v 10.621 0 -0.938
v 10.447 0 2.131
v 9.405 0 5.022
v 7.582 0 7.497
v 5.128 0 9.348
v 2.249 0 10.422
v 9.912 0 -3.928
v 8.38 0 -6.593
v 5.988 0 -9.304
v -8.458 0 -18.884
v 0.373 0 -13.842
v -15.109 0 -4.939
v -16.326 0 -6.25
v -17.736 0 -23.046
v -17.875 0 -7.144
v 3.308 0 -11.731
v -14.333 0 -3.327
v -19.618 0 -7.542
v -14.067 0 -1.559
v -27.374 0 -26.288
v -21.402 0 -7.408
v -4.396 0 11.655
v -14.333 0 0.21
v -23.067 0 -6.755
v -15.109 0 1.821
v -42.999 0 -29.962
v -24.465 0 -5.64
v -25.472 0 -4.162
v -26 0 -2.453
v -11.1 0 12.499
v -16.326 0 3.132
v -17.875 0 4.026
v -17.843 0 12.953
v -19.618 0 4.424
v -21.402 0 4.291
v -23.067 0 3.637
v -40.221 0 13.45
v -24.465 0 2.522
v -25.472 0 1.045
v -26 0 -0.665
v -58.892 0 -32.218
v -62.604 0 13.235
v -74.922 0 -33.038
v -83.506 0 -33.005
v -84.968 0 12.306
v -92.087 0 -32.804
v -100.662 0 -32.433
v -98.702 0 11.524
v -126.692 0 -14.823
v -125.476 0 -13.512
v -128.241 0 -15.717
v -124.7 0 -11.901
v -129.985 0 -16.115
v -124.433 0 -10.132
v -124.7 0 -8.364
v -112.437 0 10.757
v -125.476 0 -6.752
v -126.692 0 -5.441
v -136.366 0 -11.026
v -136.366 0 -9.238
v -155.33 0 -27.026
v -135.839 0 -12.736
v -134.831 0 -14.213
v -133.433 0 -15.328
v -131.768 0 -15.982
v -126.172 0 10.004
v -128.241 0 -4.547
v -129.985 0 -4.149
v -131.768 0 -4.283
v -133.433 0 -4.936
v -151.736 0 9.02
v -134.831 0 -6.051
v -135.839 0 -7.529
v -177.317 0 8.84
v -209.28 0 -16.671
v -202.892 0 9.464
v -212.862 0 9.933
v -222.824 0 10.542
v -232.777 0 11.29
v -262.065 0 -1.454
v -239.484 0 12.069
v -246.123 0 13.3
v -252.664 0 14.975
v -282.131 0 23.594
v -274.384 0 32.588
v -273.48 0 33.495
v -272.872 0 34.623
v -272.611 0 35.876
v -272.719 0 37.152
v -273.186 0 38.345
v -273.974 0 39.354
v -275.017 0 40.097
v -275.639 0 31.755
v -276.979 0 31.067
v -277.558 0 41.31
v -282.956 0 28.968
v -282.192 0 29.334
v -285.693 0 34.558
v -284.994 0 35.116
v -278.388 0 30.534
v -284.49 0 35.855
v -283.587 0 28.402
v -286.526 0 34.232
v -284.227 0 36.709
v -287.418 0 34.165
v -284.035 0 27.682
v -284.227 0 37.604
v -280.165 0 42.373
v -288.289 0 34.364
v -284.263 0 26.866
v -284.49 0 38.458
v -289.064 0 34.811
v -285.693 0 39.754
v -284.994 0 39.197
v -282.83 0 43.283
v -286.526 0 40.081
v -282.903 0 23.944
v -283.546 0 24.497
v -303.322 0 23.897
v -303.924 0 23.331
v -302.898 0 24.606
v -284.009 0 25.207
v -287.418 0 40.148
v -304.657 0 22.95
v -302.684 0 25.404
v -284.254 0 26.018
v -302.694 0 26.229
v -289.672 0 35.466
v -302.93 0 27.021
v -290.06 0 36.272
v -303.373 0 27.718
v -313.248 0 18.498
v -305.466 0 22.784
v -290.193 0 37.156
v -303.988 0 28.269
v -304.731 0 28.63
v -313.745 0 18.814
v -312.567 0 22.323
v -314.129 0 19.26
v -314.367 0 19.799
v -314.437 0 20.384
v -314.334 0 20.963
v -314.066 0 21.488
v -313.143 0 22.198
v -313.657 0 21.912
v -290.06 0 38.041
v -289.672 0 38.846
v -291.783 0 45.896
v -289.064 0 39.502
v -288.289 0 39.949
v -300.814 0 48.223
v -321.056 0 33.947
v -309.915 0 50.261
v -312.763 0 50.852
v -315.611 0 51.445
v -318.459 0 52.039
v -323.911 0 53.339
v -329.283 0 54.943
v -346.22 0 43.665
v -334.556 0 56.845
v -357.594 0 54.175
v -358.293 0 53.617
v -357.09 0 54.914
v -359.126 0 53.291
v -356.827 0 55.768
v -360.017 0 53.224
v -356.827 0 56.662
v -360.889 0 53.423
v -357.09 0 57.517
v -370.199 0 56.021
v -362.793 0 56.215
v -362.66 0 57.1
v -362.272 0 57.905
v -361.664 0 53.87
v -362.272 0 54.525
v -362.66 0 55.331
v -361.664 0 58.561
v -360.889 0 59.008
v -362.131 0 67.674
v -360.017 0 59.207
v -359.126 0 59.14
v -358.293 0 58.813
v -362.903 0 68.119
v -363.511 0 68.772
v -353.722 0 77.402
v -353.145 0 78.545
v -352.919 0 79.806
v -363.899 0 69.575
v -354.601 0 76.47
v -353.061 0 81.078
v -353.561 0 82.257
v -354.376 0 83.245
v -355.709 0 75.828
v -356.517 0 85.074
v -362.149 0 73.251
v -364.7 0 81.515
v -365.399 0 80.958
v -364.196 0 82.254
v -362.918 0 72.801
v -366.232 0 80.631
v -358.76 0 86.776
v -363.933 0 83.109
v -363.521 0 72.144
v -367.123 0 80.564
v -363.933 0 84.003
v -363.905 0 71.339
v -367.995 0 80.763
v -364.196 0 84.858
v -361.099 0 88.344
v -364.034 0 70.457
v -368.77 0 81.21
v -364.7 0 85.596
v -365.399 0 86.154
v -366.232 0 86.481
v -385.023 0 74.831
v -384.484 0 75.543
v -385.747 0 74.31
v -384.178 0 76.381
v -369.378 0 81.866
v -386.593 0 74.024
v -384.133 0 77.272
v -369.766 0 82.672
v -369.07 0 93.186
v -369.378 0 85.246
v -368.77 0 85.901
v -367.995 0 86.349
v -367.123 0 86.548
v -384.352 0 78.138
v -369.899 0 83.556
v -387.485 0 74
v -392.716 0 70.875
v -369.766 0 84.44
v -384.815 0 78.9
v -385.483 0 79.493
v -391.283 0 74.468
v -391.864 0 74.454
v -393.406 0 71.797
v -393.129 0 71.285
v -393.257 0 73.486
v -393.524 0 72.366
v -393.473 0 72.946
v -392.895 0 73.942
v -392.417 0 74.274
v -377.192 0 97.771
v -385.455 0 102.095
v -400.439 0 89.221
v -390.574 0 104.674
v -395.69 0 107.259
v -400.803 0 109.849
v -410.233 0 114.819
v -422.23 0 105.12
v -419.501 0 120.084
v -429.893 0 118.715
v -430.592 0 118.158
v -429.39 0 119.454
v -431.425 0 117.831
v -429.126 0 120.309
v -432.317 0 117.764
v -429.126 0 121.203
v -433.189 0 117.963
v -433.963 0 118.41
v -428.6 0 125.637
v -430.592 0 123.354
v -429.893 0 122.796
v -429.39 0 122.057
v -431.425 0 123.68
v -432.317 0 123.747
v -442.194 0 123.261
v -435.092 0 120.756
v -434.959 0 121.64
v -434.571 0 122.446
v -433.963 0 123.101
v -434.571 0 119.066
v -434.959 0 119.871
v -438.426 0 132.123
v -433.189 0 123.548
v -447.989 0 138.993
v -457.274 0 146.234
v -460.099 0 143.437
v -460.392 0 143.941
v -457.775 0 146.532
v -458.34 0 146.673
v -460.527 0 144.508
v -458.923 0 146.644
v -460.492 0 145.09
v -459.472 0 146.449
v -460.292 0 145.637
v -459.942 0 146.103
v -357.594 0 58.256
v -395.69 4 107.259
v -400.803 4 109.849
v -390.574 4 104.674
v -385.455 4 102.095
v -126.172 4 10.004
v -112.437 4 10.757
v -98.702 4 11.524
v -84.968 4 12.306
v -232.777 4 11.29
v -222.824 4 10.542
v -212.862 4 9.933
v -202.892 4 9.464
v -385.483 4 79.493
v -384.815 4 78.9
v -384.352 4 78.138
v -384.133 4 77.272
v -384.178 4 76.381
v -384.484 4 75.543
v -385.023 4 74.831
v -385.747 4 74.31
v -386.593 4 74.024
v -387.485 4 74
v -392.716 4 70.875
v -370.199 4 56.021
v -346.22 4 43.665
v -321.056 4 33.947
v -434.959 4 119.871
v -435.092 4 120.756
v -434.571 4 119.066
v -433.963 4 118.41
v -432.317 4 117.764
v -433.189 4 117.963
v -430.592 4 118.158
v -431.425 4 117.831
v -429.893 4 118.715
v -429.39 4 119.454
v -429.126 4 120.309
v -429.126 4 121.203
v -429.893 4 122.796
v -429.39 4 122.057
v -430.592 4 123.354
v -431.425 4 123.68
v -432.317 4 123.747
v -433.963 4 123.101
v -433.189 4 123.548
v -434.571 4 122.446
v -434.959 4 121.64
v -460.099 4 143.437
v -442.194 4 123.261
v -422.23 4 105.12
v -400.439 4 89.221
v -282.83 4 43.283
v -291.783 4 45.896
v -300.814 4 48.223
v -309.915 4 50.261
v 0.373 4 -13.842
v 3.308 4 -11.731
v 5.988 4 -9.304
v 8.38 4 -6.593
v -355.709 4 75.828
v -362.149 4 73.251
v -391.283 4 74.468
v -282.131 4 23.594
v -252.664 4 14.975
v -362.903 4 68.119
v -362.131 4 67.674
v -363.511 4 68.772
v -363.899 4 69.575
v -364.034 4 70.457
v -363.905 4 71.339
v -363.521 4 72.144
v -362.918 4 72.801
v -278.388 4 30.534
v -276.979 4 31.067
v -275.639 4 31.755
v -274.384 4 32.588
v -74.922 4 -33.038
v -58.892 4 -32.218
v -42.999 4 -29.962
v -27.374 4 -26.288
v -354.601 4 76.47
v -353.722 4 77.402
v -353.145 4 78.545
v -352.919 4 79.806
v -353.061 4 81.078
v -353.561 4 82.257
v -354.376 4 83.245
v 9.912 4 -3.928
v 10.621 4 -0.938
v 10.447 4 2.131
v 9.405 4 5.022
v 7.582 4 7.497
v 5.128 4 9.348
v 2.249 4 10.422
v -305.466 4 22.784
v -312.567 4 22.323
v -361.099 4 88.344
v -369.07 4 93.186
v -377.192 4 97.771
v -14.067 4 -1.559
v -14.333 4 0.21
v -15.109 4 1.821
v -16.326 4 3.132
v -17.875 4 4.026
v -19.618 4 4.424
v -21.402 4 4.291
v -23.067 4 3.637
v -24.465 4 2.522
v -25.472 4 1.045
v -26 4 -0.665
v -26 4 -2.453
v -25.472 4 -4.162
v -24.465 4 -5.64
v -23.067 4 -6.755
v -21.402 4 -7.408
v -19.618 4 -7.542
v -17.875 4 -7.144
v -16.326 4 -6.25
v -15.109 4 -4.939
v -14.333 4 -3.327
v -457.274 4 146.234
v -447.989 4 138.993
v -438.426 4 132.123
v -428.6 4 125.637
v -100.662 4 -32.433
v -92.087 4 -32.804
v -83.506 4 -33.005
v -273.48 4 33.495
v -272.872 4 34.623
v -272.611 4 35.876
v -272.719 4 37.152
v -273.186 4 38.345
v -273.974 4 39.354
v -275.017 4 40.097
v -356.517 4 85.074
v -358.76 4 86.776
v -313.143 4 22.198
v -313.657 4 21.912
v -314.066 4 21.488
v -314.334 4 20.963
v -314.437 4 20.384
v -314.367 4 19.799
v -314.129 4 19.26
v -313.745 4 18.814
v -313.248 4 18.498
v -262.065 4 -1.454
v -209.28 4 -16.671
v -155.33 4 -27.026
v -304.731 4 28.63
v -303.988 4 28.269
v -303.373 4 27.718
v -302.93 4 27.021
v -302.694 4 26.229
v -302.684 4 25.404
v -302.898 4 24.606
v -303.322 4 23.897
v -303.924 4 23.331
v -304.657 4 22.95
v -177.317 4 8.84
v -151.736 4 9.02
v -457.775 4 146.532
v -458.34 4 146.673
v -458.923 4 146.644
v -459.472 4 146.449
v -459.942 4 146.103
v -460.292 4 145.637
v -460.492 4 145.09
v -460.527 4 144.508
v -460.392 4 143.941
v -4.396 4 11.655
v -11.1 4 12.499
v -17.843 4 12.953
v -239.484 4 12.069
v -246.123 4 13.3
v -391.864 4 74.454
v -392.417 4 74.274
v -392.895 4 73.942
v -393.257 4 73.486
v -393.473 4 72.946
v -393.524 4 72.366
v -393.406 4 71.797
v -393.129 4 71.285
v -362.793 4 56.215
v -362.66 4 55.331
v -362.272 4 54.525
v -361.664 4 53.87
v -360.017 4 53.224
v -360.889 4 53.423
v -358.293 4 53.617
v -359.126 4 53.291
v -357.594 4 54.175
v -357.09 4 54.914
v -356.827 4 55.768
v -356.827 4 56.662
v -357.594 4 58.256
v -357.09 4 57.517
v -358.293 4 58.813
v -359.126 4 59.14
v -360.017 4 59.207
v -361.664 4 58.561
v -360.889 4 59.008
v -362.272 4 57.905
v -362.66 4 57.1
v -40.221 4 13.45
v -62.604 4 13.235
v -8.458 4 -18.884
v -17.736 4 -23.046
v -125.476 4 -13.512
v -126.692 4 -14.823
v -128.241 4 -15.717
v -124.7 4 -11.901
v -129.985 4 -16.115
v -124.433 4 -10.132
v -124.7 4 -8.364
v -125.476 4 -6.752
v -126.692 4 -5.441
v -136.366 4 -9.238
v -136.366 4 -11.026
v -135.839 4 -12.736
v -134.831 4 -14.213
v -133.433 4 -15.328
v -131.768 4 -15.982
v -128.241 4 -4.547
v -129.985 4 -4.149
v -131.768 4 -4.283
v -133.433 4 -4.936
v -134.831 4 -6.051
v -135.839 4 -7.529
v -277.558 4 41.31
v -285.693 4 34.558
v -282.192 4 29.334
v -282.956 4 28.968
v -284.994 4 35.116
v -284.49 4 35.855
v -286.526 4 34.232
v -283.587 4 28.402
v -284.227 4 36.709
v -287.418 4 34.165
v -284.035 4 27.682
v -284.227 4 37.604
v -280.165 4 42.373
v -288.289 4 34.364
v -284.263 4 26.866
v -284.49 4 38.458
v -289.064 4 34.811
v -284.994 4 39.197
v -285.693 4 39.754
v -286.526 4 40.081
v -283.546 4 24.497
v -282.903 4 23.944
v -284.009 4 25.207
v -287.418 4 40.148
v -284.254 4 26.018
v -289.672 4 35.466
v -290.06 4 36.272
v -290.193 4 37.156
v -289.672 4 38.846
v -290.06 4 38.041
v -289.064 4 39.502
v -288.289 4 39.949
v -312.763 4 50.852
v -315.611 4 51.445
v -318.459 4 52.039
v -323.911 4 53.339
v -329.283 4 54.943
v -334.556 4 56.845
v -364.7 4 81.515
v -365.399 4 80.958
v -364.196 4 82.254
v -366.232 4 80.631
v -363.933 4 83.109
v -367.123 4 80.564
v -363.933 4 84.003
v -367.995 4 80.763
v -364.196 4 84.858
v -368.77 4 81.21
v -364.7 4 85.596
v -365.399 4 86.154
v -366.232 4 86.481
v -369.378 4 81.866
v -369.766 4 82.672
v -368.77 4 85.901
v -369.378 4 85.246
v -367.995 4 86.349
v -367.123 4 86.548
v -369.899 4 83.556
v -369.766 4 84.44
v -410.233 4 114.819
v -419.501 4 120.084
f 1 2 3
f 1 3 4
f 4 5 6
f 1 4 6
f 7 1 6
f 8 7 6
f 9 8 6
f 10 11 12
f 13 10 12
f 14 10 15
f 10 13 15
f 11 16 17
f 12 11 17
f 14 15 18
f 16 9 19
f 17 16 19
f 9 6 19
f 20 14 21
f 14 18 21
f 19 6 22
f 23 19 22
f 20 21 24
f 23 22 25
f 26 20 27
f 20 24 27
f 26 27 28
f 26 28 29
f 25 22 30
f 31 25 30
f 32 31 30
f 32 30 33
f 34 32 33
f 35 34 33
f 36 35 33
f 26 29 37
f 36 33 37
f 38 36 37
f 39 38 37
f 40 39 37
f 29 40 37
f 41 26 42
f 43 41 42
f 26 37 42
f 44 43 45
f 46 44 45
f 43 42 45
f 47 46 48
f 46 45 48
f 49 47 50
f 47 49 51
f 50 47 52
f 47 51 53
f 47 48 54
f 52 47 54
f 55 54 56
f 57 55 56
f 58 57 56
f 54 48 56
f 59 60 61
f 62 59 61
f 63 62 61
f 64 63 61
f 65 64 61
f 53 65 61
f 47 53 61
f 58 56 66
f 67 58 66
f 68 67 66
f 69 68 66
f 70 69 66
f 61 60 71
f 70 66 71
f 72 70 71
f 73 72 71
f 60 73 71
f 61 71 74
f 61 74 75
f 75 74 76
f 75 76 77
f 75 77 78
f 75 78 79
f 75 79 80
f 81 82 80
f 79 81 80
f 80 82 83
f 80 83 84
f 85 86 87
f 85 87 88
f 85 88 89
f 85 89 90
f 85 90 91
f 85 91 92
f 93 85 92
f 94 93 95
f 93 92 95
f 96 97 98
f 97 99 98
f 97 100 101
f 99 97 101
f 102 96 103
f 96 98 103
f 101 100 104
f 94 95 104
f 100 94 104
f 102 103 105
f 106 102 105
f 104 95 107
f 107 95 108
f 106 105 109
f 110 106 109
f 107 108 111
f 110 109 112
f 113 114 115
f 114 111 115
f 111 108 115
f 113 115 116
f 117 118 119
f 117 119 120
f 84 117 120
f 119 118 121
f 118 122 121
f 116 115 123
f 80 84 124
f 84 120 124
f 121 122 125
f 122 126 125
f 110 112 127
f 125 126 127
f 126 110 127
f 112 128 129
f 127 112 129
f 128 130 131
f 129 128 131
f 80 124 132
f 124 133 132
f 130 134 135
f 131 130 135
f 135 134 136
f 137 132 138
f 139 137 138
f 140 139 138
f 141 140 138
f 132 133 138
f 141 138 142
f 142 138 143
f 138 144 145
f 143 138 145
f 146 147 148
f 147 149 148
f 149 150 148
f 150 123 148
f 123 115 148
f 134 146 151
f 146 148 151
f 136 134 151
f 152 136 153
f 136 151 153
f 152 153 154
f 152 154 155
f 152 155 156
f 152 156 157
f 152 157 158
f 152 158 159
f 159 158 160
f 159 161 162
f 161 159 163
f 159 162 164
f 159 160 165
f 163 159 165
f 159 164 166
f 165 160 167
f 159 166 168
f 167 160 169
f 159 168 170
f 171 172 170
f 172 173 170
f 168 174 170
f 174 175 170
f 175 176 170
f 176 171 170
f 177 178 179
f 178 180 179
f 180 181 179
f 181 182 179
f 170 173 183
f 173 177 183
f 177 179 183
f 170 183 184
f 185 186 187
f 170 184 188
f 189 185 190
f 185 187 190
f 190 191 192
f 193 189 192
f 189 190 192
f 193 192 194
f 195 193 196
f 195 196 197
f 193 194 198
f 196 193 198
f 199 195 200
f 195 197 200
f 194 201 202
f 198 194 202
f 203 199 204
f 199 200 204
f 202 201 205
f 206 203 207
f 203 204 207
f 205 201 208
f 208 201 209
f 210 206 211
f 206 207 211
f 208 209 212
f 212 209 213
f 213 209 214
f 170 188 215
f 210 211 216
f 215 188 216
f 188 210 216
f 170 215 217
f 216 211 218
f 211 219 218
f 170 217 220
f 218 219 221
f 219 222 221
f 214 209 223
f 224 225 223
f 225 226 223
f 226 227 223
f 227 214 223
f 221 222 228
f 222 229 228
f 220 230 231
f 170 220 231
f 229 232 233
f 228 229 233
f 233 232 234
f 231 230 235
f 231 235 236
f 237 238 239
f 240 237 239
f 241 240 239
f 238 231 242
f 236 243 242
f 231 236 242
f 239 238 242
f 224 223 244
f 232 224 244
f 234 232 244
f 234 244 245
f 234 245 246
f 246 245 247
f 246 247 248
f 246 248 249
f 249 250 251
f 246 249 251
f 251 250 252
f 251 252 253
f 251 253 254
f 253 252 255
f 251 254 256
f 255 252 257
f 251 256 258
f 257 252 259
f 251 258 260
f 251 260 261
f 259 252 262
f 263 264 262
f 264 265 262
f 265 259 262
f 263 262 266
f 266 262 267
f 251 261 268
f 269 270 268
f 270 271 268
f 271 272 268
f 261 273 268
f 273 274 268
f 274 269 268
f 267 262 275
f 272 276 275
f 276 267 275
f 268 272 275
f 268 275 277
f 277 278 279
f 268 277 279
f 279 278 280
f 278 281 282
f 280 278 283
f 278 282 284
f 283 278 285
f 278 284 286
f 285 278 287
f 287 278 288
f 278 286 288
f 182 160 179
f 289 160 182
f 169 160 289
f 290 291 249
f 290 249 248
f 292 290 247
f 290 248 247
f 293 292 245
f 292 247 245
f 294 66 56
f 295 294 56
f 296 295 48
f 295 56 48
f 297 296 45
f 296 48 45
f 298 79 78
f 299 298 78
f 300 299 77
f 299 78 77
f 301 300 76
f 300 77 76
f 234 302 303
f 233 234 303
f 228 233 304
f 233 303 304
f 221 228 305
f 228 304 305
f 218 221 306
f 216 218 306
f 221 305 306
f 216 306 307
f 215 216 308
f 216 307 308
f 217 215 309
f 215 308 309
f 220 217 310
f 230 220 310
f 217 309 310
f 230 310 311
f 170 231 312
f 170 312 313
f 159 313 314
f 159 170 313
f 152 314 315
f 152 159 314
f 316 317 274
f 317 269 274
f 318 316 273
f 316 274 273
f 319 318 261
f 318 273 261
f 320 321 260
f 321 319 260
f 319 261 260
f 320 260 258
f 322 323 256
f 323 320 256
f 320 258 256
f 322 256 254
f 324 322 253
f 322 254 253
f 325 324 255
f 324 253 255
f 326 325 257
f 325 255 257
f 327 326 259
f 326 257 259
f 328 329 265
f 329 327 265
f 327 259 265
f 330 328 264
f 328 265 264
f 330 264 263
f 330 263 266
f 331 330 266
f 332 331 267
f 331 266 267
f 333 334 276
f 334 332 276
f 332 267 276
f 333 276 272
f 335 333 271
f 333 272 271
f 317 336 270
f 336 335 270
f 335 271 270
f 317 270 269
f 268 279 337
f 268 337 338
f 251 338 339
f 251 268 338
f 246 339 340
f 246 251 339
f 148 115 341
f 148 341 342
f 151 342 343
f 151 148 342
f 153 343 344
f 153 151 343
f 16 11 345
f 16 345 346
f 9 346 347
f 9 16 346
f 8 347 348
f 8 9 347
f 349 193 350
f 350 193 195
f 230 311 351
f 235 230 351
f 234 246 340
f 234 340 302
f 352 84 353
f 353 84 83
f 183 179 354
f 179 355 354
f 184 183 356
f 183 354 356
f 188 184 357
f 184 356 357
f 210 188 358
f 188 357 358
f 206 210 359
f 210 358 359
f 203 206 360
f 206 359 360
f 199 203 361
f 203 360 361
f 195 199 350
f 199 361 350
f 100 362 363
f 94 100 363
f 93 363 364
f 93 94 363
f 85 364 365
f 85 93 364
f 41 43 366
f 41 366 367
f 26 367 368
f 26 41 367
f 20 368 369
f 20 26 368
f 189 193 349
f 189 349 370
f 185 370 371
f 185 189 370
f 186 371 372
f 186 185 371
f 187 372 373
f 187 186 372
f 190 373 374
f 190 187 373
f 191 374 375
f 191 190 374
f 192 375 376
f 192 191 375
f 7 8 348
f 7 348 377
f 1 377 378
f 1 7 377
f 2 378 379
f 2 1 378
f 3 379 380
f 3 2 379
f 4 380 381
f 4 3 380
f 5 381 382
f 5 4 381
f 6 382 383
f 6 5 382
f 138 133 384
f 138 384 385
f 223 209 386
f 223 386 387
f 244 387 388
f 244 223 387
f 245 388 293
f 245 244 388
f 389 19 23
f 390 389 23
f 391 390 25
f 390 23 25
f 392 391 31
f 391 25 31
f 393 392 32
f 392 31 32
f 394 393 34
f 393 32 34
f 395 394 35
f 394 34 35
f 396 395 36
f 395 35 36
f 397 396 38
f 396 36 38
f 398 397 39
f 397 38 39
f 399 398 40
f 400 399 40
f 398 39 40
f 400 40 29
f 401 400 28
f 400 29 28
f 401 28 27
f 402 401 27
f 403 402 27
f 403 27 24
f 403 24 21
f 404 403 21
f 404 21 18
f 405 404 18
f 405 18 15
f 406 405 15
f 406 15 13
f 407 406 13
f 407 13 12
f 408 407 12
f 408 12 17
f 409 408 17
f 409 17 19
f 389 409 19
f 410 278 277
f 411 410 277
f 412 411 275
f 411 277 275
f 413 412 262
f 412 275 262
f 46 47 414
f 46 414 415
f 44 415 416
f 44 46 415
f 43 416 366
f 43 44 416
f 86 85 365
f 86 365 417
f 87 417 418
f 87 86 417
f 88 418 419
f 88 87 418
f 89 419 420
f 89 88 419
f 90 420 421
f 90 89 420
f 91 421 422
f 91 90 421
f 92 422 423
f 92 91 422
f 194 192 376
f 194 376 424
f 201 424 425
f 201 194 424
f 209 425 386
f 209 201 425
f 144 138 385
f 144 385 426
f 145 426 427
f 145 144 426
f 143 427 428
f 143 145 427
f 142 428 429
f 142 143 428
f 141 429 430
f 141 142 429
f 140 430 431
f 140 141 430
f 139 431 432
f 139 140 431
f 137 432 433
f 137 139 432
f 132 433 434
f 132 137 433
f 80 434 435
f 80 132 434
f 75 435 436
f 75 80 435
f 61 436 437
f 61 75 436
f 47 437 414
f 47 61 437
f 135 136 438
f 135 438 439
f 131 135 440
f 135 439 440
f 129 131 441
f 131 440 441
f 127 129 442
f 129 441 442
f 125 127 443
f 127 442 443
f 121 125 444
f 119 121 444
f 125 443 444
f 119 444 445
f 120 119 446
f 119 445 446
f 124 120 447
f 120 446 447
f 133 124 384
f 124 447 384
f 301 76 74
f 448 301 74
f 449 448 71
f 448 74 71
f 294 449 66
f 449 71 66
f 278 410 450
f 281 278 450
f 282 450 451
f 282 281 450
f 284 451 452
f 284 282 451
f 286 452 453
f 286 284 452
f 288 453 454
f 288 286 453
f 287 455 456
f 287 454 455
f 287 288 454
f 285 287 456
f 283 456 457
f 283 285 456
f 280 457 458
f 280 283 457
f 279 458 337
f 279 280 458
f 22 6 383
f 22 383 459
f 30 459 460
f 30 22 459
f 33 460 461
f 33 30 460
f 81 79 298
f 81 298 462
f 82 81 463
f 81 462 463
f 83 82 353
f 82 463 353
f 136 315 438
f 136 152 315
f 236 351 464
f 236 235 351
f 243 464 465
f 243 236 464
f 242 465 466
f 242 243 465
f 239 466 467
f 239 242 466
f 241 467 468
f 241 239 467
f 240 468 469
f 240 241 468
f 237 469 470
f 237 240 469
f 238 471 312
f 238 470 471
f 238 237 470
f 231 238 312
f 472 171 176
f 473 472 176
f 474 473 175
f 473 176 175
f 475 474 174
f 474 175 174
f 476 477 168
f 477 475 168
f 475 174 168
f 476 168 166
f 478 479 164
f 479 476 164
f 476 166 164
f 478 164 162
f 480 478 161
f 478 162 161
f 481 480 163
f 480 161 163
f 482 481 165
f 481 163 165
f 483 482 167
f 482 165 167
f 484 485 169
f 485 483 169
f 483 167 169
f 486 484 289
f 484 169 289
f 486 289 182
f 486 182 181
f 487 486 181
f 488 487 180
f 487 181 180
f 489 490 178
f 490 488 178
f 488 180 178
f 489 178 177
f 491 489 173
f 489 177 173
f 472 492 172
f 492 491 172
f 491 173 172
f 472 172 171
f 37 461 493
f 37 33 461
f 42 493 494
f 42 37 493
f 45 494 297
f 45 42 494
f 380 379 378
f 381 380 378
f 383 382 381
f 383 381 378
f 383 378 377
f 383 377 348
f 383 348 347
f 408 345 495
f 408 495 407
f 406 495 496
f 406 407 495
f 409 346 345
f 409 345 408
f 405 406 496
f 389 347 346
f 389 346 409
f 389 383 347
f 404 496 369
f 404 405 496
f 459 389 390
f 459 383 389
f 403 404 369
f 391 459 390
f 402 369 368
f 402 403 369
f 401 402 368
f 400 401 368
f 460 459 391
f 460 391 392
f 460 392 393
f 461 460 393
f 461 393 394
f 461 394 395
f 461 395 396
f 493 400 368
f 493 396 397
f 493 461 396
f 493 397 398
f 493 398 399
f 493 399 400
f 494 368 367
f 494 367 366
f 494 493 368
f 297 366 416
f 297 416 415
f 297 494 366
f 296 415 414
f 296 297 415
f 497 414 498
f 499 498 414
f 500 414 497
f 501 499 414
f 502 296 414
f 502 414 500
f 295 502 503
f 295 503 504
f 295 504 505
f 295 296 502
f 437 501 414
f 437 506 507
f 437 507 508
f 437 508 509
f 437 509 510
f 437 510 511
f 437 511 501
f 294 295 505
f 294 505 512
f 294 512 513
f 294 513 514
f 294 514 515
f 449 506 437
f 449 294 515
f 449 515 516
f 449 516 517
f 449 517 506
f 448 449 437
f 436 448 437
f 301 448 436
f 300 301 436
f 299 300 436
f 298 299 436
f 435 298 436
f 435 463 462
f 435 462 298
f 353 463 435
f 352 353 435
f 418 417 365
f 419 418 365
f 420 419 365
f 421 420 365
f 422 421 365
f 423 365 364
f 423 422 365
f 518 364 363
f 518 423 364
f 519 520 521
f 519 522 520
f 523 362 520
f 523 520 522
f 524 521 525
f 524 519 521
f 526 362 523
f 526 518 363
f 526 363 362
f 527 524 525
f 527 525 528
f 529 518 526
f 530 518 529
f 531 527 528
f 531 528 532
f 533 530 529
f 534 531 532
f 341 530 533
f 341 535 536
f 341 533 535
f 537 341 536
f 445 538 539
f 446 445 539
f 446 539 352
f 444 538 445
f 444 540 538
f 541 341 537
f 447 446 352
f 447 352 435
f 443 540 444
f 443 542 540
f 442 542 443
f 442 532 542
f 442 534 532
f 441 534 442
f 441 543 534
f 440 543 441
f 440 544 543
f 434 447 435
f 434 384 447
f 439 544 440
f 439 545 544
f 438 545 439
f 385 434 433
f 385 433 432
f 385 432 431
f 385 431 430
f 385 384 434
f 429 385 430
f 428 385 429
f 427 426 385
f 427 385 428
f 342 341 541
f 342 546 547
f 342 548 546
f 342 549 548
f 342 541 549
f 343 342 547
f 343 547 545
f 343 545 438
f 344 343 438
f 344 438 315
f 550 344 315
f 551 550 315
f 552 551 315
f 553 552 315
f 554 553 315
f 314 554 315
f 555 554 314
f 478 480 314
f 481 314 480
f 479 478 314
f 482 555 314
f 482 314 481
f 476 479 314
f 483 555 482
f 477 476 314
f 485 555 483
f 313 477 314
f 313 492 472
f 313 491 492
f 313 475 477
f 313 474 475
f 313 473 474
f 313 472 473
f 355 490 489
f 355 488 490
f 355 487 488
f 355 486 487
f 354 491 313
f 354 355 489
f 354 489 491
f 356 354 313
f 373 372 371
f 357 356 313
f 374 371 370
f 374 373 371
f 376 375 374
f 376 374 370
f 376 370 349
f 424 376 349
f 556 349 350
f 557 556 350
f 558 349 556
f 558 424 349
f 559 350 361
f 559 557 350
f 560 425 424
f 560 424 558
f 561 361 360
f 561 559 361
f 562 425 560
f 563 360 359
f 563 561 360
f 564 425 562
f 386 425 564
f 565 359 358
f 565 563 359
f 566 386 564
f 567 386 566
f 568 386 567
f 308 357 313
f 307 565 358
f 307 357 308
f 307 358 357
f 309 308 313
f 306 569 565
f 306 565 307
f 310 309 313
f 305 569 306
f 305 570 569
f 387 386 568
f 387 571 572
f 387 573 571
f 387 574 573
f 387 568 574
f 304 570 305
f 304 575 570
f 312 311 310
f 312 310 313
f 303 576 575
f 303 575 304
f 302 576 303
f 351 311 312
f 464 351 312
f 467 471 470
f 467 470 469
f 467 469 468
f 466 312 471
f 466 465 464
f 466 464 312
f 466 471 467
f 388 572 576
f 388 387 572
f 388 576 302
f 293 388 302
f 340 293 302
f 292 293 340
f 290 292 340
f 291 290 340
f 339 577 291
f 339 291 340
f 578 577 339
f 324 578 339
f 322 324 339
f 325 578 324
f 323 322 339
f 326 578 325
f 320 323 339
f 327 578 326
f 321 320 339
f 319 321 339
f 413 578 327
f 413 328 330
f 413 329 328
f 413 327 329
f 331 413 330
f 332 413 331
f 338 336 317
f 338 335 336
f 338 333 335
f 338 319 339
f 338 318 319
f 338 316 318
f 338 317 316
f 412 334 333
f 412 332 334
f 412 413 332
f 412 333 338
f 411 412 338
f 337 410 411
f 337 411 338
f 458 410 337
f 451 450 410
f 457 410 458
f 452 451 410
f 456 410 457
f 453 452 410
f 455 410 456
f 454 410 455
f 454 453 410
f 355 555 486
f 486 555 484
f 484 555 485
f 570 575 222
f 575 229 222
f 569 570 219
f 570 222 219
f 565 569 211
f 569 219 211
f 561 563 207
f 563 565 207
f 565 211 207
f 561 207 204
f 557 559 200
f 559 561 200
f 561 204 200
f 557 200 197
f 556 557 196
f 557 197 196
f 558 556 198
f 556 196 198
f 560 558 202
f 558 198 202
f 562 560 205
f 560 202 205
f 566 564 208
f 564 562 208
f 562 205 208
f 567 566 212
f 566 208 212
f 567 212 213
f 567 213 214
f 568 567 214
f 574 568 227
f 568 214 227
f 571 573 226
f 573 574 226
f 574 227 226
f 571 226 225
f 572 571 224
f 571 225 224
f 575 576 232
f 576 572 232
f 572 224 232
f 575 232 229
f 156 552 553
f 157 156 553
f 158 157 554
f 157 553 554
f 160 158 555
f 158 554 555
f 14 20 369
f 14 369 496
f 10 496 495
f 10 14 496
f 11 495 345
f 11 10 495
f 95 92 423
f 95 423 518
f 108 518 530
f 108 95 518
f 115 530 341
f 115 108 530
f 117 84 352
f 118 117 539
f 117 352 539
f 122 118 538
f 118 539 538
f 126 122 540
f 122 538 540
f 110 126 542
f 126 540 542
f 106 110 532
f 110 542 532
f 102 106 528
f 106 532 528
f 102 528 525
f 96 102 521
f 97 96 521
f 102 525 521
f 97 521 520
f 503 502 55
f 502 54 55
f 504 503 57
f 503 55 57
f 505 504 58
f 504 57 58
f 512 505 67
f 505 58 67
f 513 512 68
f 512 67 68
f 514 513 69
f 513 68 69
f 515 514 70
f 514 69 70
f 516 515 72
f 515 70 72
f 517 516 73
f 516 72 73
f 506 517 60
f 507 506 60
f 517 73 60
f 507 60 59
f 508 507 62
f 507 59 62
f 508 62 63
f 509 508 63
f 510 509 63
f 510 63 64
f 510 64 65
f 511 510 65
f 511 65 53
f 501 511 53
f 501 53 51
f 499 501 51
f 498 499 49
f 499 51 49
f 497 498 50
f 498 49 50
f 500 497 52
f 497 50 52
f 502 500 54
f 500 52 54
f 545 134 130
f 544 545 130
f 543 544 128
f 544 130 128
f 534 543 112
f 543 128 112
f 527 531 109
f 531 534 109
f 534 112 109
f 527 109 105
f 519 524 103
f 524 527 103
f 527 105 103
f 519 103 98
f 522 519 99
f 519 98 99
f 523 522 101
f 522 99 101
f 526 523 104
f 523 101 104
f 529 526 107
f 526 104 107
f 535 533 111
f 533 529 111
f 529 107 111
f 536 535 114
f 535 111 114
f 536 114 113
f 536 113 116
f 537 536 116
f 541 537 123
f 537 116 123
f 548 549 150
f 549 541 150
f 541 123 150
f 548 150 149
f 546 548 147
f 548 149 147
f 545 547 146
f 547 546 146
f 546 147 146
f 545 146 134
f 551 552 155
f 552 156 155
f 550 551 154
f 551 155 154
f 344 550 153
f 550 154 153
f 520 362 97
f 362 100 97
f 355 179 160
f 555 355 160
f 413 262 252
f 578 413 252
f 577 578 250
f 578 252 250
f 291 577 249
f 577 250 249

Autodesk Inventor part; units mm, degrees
ref_plane "YZ Plane" through (0, 0, 0) normal (1, 0, 0) x (0, 1, 0)
ref_plane "XZ Plane" through (0, 0, 0) normal (0, 1, 0) x (-1, 0, 0)
ref_plane "XY Plane" through (0, 0, 0) normal (0, 0, 1) x (1, 0, 0)
sketch "スケッチ2" plane through (0, 0, 0) normal (0, 1, 0) x (-1, 0, 0)
  circle A0 centre (366.8992, 83.5559) radius 3 projected
  circle A1 centre (432.0925, 120.7557) radius 3 projected
  arc A2 (460.0993, 143.4366) -> (457.2735, 146.2345) centre (458.5344, 144.682) ccw projected
  arc A3 (400.439, 89.2207) -> (460.0993, 143.4366) centre (263.302, 300.0629) ccw projected
  arc A4 (391.277, 83.6402) -> (400.439, 89.2207) centre (301.619, 241.1522) ccw projected
  arc A5 (372.7132, 76.1699) -> (391.277, 83.6402) centre (354.4726, 148.2986) ccw projected
  arc A6 (360.1081, 74.8804) -> (372.7132, 76.1699) centre (362.0183, 118.4608) ccw projected
  arc A7 (355.7086, 75.8282) -> (360.1081, 74.8804) centre (360.696, 88.2936) ccw projected
  arc A8 (354.3762, 83.2451) -> (355.7086, 75.8282) centre (357.3588, 79.9528) ccw projected
  arc A9 (361.0987, 88.3442) -> (354.3762, 83.2451) centre (386.9085, 47.3355) ccw projected
  arc A10 (385.4553, 102.095) -> (361.0987, 88.3442) centre (517.0615, -159.4623) ccw projected
  arc A11 (385.4553, 102.095) -> (400.8032, 109.8486) centre (-2010.0977, 4863.0707) ccw projected
  arc A12 (400.8032, 109.8486) -> (428.5996, 125.6368) centre (247.4107, 412.2703) ccw projected
  arc A13 (428.5996, 125.6368) -> (457.2735, 146.2345) centre (269.2327, 377.7487) ccw projected
  circle A14 centre (287.1934, 37.1564) radius 3 projected
  circle A15 centre (359.7933, 56.2153) radius 3 projected
  arc A16 (392.7161, 70.8747) -> (390.7107, 74.3087) centre (391.5269, 72.4828) ccw projected
  arc A17 (321.0565, 33.9474) -> (392.7161, 70.8747) centre (243.1623, 273.099) ccw projected
  arc A18 (310.7624, 30.9284) -> (321.0565, 33.9474) centre (264.9264, 206.2785) ccw projected
  arc A19 (290.8977, 28.5173) -> (310.7624, 30.9284) centre (291.9468, 102.9093) ccw projected
  arc A20 (278.3883, 30.5342) -> (290.8977, 28.5173) centre (291.5128, 72.1352) ccw projected
  arc A21 (274.384, 32.5883) -> (278.3883, 30.5342) centre (282.4278, 43.3382) ccw projected
  arc A22 (275.0166, 40.0974) -> (274.384, 32.5883) centre (277.0456, 36.1453) ccw projected
  arc A23 (282.8299, 43.2828) -> (275.0166, 40.0974) centre (297.1464, -3.0086) ccw projected
  arc A24 (309.9154, 50.2611) -> (282.8299, 43.2828) centre (369.3413, -236.446) ccw projected
  arc A25 (309.9154, 50.2611) -> (326.7472, 53.7782) centre (-771.7798, 5269.0252) ccw projected
  arc A26 (326.7472, 53.7782) -> (357.6827, 61.8342) centre (256.8539, 385.5961) ccw projected
  arc A27 (357.6827, 61.8342) -> (390.7107, 74.3087) centre (268.9975, 346.6028) ccw projected
  circle A28 centre (20.0666, -1.5588) radius 5 projected
  circle A29 centre (130.4331, -10.1322) radius 5 projected
  arc A30 (313.248, 18.4984) -> (312.0524, 22.2894) centre (312.4376, 20.3268) ccw projected
  arc A31 (100.6618, -32.4332) -> (313.248, 18.4984) centre (68.6386, 570.3585) ccw projected
  arc A32 (74.9225, -33.0376) -> (100.6618, -32.4332) centre (77.5861, 401.9345) ccw projected
  arc A33 (27.374, -26.2879) -> (74.9225, -33.0376) centre (76.0159, 145.5175) ccw projected
  arc A34 (-0.3728, -13.8419) -> (27.374, -26.2879) centre (55.8939, 74.446) ccw projected
  arc A35 (-8.3795, -6.5926) -> (-0.3728, -13.8419) centre (16.9451, 13.3315) ccw projected
  arc A36 (-2.2486, 10.4222) -> (-8.3795, -6.5926) centre (0, 0) ccw projected
  arc A37 (17.8428, 12.9532) -> (-2.2486, 10.4222) centre (22.277, -103.2534) ccw projected
  arc A38 (84.9679, 12.306) -> (17.8428, 12.9532) centre (44.6377, -689.2581) ccw projected
  arc A39 (84.9679, 12.306) -> (126.1724, 10.004) centre (819.0754, 12782.4716) ccw projected
  arc A40 (126.1724, 10.004) -> (202.8919, 9.4636) centre (170.258, 822.6468) ccw projected
  arc A41 (202.8919, 9.4636) -> (312.0524, 22.2894) centre (174.1884, 724.7085) ccw projected
  line L0 (400.439, 89.2207) -> (374.6007, 72.4148)
  line L1 (374.6007, 72.4148) -> (391.2826, 74.4678)
  line L2 (355.7086, 75.8282) -> (369.1755, 70.4401)
  line L3 (369.1755, 70.4401) -> (326.7472, 53.7782)
  line L4 (321.0565, 33.9474) -> (289.8884, 23.7957)
  line L5 (289.8884, 23.7957) -> (312.5672, 22.3226)
  line L6 (278.3883, 30.5342) -> (291.6044, 26.3646)
  line L7 (291.6044, 26.3646) -> (243.2783, 12.2299)
  point P0 (0, 0)
extrude "押し出し2" add sketch "スケッチ2" along normal blind 4
fillet "フィレット2" radius 3 4 edges at (-369.1755, 2, 70.4401) (-291.6044, 2, 26.3646) (-374.6007, 2, 72.4148) (-289.8884, 2, 23.7957)
fillet "フィレット2" radius 100 2 edges at (-326.7472, 2, 53.7782) (-243.2783, 2, 12.2299)
sketch "スケッチ3" plane through (0, 0, 0) normal (0, -1, 0) x (1, 0, 0)
  circle A0 centre (-20.0666, -1.5588) radius 6
  circle A1 centre (-130.4331, -10.1322) radius 6
  circle A2 centre (-130.4331, -10.1322) radius 5 projected
  circle A3 centre (-20.0666, -1.5588) radius 5 projected
  point P0 (0, 0)
  dimension "d10" = 12
  dimension "d11" = 12
extrude "押し出し3" cut sketch "スケッチ3" against normal through all
equation "\"d11\" = d10"
properties part number "bracket2" material "木材 (オーク)"
